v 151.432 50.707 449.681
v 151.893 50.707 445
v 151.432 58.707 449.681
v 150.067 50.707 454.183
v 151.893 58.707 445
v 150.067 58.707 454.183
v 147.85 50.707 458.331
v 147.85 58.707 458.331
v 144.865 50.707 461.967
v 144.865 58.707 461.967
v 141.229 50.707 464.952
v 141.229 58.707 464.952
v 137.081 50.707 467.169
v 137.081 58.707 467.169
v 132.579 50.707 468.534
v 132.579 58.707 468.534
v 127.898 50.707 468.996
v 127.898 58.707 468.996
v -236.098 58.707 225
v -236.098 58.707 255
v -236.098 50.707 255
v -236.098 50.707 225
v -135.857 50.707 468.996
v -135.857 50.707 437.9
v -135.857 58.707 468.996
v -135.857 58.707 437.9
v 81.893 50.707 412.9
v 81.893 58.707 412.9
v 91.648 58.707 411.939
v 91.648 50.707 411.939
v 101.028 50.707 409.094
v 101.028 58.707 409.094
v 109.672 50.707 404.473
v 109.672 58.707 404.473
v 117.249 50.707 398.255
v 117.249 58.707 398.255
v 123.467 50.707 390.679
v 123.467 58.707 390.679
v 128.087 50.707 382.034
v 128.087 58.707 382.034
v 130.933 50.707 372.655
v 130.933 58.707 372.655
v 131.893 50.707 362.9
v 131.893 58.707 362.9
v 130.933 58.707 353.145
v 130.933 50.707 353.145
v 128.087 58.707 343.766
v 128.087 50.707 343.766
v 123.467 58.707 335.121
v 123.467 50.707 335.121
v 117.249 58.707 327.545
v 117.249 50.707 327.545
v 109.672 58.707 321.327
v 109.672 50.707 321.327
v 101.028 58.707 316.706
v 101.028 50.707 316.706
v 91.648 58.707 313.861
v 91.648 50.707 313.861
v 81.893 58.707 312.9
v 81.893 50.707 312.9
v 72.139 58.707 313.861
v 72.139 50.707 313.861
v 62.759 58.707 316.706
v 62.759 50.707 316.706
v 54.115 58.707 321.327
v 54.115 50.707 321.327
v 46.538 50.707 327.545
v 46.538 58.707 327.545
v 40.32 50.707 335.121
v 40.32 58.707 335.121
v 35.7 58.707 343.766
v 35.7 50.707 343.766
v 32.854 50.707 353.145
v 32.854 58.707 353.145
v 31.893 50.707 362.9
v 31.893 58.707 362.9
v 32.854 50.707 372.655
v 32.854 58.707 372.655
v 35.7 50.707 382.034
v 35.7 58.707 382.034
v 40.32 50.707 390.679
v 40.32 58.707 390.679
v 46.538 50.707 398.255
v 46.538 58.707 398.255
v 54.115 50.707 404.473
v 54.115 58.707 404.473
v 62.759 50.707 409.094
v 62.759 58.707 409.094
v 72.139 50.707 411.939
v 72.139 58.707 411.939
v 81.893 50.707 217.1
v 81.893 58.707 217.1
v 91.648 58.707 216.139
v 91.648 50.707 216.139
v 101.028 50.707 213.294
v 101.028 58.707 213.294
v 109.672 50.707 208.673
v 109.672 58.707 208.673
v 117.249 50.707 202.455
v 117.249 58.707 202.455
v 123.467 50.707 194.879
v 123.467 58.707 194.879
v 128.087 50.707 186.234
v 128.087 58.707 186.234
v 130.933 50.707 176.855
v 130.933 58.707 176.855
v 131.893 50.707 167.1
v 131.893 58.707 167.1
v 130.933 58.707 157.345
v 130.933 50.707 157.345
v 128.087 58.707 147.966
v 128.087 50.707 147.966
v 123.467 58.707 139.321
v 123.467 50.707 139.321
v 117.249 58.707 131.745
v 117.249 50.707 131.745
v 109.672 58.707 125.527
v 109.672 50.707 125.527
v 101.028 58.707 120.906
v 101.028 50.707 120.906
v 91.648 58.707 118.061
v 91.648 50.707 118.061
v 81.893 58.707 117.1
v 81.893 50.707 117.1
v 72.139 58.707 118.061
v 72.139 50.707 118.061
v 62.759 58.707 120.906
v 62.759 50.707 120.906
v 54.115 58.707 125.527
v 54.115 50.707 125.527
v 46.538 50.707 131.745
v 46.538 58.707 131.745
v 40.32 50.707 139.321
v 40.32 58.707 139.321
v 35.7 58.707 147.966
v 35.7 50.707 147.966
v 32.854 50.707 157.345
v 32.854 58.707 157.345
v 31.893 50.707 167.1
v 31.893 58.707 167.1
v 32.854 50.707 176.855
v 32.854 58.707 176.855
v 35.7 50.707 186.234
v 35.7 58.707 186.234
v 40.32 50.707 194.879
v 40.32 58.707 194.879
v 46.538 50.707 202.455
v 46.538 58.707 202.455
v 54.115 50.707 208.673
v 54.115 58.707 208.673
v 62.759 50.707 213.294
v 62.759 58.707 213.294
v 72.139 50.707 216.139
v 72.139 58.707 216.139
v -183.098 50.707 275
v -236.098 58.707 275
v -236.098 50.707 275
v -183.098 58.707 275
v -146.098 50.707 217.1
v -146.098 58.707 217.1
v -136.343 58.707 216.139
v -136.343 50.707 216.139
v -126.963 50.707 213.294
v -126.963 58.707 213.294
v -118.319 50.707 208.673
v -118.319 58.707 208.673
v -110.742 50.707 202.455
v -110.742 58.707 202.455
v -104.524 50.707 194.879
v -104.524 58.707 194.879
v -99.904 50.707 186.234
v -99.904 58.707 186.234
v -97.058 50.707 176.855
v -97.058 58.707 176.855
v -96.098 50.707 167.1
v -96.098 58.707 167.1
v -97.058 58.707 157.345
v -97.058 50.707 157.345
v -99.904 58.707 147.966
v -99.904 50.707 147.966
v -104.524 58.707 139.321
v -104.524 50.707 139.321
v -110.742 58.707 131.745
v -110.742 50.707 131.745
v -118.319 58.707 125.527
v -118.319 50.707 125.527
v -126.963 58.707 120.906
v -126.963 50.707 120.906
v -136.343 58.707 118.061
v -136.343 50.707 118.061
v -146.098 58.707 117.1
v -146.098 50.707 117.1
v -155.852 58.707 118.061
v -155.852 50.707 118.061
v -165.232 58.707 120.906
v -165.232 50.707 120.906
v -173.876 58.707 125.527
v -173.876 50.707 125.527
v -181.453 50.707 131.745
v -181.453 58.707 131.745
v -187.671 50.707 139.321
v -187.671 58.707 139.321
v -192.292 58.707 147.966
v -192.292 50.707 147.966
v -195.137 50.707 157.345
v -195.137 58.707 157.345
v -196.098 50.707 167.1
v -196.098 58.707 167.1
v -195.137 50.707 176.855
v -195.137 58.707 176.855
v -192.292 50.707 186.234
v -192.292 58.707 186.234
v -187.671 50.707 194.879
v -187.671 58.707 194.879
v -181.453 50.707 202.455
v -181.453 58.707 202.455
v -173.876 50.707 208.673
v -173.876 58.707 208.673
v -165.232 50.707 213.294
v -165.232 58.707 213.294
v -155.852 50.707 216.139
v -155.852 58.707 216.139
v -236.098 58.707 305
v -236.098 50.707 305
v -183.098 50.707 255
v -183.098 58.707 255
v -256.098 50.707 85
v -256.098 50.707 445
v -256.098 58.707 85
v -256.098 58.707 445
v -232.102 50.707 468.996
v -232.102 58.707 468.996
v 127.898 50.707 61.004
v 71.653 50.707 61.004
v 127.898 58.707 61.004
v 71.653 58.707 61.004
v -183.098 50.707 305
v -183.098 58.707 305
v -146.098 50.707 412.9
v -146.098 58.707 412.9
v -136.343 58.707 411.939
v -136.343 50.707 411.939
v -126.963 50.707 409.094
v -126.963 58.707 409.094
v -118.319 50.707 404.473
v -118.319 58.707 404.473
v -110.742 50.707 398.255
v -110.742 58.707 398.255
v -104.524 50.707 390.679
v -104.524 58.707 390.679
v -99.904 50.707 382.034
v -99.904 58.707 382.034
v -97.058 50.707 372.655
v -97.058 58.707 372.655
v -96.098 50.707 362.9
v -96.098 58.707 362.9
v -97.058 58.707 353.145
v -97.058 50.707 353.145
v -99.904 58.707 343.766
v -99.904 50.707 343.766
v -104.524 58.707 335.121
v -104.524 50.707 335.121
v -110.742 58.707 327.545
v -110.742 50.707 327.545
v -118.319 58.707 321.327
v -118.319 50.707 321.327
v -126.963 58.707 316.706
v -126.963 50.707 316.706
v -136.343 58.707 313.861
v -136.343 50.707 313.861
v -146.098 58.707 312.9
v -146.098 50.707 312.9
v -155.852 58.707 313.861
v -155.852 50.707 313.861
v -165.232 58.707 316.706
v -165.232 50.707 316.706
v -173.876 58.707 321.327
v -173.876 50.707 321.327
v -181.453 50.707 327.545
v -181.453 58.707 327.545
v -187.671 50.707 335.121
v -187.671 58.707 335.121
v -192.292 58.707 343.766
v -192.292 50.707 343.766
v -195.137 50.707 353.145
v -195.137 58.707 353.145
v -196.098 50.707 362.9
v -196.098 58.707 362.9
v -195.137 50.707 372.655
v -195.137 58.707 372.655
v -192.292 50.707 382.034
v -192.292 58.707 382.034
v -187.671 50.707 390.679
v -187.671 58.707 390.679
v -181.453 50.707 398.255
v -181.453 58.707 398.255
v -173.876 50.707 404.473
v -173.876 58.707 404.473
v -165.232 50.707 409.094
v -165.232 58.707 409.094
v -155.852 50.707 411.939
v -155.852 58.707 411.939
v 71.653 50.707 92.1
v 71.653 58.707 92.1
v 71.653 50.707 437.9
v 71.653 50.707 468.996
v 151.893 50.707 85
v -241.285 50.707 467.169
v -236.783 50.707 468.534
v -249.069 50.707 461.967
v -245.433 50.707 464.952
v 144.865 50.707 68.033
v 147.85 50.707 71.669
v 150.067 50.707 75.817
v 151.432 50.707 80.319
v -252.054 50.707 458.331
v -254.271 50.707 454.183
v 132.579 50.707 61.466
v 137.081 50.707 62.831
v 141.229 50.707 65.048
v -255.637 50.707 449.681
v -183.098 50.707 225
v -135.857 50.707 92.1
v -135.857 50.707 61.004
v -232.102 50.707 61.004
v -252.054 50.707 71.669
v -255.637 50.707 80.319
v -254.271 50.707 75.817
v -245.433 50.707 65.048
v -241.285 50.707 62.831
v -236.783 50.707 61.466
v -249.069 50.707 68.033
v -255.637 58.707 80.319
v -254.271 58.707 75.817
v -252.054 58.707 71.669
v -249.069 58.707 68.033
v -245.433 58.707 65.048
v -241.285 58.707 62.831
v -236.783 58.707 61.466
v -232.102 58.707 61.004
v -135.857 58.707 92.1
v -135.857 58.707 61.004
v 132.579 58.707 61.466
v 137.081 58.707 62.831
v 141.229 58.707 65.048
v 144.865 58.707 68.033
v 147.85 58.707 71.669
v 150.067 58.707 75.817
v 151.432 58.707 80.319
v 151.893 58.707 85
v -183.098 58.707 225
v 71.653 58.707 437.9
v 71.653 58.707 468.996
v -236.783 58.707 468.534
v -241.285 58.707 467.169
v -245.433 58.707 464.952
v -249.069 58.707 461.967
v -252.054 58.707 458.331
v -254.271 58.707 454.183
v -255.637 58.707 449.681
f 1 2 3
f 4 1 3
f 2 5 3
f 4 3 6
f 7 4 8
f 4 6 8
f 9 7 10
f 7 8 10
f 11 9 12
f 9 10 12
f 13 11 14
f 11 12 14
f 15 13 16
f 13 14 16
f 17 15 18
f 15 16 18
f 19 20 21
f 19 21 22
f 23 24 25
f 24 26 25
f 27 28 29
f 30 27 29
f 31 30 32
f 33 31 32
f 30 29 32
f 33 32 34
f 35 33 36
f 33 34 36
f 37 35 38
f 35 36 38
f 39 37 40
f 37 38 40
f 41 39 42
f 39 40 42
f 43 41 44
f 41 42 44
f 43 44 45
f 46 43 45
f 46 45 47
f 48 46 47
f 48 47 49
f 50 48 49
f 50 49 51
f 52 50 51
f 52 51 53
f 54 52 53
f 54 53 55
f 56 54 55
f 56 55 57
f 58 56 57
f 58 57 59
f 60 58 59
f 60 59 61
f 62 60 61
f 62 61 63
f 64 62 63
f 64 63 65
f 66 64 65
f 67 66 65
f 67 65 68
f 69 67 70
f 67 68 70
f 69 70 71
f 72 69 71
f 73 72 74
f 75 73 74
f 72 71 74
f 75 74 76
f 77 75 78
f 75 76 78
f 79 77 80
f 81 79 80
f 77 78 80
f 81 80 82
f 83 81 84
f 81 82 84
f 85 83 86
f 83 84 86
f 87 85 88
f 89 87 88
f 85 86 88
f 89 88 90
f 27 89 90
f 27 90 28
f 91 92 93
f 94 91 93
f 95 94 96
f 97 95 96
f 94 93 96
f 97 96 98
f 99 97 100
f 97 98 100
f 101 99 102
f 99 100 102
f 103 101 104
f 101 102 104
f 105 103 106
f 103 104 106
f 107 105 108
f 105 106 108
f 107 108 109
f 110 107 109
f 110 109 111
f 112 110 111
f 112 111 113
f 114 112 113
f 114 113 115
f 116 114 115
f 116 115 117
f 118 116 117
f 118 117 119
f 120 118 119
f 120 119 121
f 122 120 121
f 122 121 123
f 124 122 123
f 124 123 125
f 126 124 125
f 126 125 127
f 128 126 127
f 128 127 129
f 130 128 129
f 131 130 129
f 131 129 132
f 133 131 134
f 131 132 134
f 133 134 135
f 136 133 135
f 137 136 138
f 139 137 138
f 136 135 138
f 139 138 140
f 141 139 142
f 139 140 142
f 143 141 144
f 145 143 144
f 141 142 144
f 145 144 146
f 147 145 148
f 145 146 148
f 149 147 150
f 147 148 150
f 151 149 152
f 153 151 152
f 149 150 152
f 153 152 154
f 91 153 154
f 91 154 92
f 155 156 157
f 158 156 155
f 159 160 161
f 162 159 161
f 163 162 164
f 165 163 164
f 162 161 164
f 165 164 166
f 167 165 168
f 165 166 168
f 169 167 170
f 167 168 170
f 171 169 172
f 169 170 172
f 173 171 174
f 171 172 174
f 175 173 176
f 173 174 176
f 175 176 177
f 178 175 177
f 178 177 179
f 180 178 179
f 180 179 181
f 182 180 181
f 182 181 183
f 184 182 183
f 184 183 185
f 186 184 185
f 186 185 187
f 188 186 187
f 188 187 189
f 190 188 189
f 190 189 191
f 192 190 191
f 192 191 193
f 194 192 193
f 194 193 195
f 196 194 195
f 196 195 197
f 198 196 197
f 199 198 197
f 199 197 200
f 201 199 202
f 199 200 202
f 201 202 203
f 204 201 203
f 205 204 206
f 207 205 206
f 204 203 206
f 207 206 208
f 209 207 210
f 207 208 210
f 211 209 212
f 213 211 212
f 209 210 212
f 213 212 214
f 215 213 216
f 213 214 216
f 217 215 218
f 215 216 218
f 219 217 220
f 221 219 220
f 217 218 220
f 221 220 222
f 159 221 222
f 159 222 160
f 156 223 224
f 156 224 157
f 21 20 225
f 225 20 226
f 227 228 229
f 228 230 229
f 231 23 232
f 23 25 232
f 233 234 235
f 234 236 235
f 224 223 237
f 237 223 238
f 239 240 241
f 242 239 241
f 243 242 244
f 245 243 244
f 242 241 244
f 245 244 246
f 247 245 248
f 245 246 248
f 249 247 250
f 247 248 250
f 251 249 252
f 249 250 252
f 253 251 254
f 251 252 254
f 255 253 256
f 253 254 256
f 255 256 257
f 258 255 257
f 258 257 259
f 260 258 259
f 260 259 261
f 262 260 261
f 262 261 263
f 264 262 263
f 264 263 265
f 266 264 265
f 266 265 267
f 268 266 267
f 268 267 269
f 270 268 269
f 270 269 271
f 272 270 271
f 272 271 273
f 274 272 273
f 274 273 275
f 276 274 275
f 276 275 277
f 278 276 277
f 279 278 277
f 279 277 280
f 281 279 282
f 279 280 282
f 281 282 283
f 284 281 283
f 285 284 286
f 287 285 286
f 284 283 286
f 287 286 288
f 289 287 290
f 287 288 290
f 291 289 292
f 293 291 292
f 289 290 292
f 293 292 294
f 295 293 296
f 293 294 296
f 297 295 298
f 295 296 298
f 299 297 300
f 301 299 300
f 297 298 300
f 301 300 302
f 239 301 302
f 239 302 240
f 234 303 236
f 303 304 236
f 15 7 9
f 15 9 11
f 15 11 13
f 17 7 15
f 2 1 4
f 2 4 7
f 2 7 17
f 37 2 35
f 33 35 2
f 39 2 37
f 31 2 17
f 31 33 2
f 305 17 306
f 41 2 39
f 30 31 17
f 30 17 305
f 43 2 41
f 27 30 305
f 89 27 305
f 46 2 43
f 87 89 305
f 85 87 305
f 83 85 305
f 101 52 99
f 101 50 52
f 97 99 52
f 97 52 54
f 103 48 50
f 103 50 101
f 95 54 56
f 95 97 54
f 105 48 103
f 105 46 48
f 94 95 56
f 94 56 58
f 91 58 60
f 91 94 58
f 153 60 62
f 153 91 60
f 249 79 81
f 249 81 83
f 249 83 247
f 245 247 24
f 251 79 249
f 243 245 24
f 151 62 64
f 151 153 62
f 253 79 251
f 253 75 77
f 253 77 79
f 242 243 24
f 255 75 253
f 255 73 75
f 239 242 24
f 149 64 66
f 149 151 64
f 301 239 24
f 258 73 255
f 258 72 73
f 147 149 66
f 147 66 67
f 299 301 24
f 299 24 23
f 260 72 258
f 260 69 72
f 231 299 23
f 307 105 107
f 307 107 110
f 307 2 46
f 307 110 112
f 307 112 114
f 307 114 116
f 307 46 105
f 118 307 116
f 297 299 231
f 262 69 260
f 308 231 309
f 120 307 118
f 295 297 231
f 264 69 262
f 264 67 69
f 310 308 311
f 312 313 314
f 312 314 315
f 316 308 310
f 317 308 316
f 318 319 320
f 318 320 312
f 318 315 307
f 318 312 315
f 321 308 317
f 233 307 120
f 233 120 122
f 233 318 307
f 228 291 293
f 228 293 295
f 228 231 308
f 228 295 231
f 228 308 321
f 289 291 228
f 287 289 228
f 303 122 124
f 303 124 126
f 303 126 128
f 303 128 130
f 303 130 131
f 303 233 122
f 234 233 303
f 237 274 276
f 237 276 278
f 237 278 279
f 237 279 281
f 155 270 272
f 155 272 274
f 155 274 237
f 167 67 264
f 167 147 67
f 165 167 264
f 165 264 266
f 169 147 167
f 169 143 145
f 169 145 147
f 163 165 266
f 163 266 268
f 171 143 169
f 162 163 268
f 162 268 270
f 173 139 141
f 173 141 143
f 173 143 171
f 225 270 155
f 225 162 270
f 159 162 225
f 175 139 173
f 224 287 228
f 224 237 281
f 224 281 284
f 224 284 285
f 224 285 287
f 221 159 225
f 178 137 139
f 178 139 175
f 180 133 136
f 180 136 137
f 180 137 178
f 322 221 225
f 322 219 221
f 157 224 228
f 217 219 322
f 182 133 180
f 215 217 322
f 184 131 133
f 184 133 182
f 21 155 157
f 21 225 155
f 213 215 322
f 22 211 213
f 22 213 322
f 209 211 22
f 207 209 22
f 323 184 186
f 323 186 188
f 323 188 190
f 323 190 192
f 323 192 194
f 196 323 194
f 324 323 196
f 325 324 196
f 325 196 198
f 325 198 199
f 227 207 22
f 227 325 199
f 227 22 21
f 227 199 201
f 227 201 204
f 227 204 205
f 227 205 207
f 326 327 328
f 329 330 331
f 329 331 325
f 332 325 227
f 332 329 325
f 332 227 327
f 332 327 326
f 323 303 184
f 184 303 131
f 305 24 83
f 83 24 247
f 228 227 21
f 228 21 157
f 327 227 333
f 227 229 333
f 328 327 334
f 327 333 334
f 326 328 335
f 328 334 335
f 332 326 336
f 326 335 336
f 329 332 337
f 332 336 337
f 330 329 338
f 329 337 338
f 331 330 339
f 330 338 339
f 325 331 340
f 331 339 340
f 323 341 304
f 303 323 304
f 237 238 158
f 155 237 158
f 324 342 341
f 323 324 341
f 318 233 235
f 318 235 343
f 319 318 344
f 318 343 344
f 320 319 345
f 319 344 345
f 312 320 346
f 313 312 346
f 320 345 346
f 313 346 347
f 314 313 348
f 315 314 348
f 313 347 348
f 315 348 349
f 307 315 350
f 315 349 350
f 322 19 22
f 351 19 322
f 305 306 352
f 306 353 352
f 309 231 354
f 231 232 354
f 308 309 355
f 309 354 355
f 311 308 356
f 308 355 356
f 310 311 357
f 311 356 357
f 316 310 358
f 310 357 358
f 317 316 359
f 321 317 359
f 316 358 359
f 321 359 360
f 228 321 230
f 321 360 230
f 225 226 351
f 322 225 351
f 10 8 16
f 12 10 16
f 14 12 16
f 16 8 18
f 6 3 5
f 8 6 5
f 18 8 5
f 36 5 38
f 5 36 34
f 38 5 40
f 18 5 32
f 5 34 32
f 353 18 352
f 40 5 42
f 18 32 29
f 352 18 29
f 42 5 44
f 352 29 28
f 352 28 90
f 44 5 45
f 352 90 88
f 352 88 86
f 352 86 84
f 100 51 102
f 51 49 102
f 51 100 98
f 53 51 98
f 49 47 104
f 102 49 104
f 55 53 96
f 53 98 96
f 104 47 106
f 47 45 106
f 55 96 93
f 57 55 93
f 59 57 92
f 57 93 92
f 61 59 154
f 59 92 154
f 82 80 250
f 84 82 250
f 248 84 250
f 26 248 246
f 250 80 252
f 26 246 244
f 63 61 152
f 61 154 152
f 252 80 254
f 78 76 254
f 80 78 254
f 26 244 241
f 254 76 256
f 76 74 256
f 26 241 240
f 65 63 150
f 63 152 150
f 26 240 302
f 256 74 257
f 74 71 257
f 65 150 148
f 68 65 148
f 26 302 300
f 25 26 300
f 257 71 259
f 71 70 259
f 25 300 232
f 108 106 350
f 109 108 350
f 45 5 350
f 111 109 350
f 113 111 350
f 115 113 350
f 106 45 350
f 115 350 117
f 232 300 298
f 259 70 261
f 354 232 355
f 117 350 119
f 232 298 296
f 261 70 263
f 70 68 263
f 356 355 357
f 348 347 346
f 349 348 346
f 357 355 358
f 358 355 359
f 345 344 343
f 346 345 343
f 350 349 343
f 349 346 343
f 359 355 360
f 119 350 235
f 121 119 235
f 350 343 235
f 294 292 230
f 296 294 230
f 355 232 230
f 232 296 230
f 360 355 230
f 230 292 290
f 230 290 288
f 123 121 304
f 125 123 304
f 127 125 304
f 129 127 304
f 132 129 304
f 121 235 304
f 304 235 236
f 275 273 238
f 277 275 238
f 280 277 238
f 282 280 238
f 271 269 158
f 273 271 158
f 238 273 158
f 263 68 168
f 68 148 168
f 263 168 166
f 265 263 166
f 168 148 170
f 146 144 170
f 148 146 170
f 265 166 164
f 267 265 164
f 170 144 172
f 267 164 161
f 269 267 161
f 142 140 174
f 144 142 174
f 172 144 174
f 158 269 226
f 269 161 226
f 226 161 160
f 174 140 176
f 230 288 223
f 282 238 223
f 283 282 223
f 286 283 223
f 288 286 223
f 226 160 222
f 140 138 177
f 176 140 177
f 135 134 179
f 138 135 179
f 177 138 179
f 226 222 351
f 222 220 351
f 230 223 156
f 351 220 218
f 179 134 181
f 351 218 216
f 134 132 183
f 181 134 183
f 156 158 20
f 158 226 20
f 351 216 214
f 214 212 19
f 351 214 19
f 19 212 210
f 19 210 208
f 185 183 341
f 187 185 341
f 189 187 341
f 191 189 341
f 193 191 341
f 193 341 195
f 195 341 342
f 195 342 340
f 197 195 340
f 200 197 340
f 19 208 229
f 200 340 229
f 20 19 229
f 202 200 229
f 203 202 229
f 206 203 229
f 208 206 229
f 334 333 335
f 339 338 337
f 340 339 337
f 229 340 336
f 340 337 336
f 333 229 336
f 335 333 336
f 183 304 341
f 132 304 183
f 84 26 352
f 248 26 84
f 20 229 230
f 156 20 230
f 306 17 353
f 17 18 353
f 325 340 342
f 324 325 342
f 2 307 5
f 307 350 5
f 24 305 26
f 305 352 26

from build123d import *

# Parameters (mm, degrees)
SALIENTE_EXTRUIR1_DEPTH = 4
CORTAR_EXTRUIR1_REACH   = 536.422
CROQUIS2_R              = 50
CROQUIS2_W              = 53
CROQUIS2_H              = 30


with BuildPart() as part:
    # Croquis1 → Saliente-Extruir1 (new, symmetric)
    with BuildSketch(Plane(origin=(0, 54.707138557, 0), x_dir=(1, 0, 0), z_dir=(0, 1, 0))):
        with BuildLine():
            Line((-135.857036721, -92.1), (71.652963279, -92.1))
            Line((71.652963279, -92.1), (71.652963279, -61.00446543))
            Line((71.652963279, -61.00446543), (127.897963279, -61.00446543))
            ThreePointArc((127.897963279, -61.00446543), (144.865368491, -68.032594788), (151.893497848, -85))
            Line((151.893497848, -85), (151.893497848, -445))
            ThreePointArc((151.893497848, -445), (144.865368491, -461.967405212), (127.897963279, -468.99553457))
            Line((127.897963279, -468.99553457), (71.652963279, -468.99553457))
            Line((71.652963279, -468.99553457), (71.652963279, -437.9))
            Line((71.652963279, -437.9), (-135.857036721, -437.9))
            Line((-135.857036721, -437.9), (-135.857036721, -468.99553457))
            Line((-135.857036721, -468.99553457), (-232.102036721, -468.99553457))
            ThreePointArc((-232.102036721, -468.99553457), (-249.069441934, -461.967405212), (-256.097571291, -445))
            Line((-256.097571291, -445), (-256.097571291, -85))
            ThreePointArc((-256.097571291, -85), (-249.069441934, -68.032594788), (-232.102036721, -61.00446543))
            Line((-232.102036721, -61.00446543), (-135.857036721, -61.00446543))
            Line((-135.857036721, -61.00446543), (-135.857036721, -92.1))
        make_face()
    extrude(amount=SALIENTE_EXTRUIR1_DEPTH, both=True)

    # Croquis2 → Cortar-Extruir1 (cut, up to next)
    with BuildSketch(Plane(origin=(0, 58.707138557, 0), x_dir=(1, 0, 0), z_dir=(0, 1, 0)), mode=Mode.PRIVATE) as cortar_extruir1_sk1:
        with Locations(Location((-146.097571291, -167.1, 0), (0, 0, 270))):
            Circle(CROQUIS2_R)
    cortar_extruir1_tool1 = extrude(cortar_extruir1_sk1.sketch, amount=-CORTAR_EXTRUIR1_REACH, mode=Mode.PRIVATE) & part.part
    # Croquis2 → Cortar-Extruir1 (cut, up to next)
    with BuildSketch(Plane(origin=(0, 58.707138557, 0), x_dir=(1, 0, 0), z_dir=(0, 1, 0)), mode=Mode.PRIVATE) as cortar_extruir1_sk2:
        with Locations(Location((81.893497848, -167.1, 0), (0, 0, 270))):
            Circle(CROQUIS2_R)
    cortar_extruir1_tool2 = extrude(cortar_extruir1_sk2.sketch, amount=-CORTAR_EXTRUIR1_REACH, mode=Mode.PRIVATE) & part.part
    # Croquis2 → Cortar-Extruir1 (cut, up to next)
    with BuildSketch(Plane(origin=(0, 58.707138557, 0), x_dir=(1, 0, 0), z_dir=(0, 1, 0)), mode=Mode.PRIVATE) as cortar_extruir1_sk3:
        with Locations(Location((81.893497848, -362.9, 0), (0, 0, 270))):
            Circle(CROQUIS2_R)
    cortar_extruir1_tool3 = extrude(cortar_extruir1_sk3.sketch, amount=-CORTAR_EXTRUIR1_REACH, mode=Mode.PRIVATE) & part.part
    # Croquis2 → Cortar-Extruir1 (cut, up to next)
    with BuildSketch(Plane(origin=(0, 58.707138557, 0), x_dir=(1, 0, 0), z_dir=(0, 1, 0)), mode=Mode.PRIVATE) as cortar_extruir1_sk4:
        with Locations(Location((-146.097571291, -362.9, 0), (0, 0, 270))):
            Circle(CROQUIS2_R)
    cortar_extruir1_tool4 = extrude(cortar_extruir1_sk4.sketch, amount=-CORTAR_EXTRUIR1_REACH, mode=Mode.PRIVATE) & part.part
    # Croquis2 → Cortar-Extruir1 (cut, up to next)
    with BuildSketch(Plane(origin=(0, 58.707138557, 0), x_dir=(1, 0, 0), z_dir=(0, 1, 0)), mode=Mode.PRIVATE) as cortar_extruir1_sk5:
        with Locations((-209.597571291, -290)):
            Rectangle(CROQUIS2_W, CROQUIS2_H)
    cortar_extruir1_tool5 = extrude(cortar_extruir1_sk5.sketch, amount=-CORTAR_EXTRUIR1_REACH, mode=Mode.PRIVATE) & part.part
    # Croquis2 → Cortar-Extruir1 (cut, up to next)
    with BuildSketch(Plane(origin=(0, 58.707138557, 0), x_dir=(1, 0, 0), z_dir=(0, 1, 0)), mode=Mode.PRIVATE) as cortar_extruir1_sk6:
        with Locations((-209.597571291, -240)):
            Rectangle(CROQUIS2_W, CROQUIS2_H)
    cortar_extruir1_tool6 = extrude(cortar_extruir1_sk6.sketch, amount=-CORTAR_EXTRUIR1_REACH, mode=Mode.PRIVATE) & part.part
    add(cortar_extruir1_tool1.solids().sort_by_distance((-146.097571, 58.707139, 167.1))[0], mode=Mode.SUBTRACT)
    add(cortar_extruir1_tool2.solids().sort_by_distance((81.893498, 58.707139, 167.1))[0], mode=Mode.SUBTRACT)
    add(cortar_extruir1_tool3.solids().sort_by_distance((81.893498, 58.707139, 362.9))[0], mode=Mode.SUBTRACT)
    add(cortar_extruir1_tool4.solids().sort_by_distance((-146.097571, 58.707139, 362.9))[0], mode=Mode.SUBTRACT)
    add(cortar_extruir1_tool5.solids().sort_by_distance((-209.597571, 58.707139, 290))[0], mode=Mode.SUBTRACT)
    add(cortar_extruir1_tool6.solids().sort_by_distance((-209.597571, 58.707139, 240))[0], mode=Mode.SUBTRACT)


solid = part.part
